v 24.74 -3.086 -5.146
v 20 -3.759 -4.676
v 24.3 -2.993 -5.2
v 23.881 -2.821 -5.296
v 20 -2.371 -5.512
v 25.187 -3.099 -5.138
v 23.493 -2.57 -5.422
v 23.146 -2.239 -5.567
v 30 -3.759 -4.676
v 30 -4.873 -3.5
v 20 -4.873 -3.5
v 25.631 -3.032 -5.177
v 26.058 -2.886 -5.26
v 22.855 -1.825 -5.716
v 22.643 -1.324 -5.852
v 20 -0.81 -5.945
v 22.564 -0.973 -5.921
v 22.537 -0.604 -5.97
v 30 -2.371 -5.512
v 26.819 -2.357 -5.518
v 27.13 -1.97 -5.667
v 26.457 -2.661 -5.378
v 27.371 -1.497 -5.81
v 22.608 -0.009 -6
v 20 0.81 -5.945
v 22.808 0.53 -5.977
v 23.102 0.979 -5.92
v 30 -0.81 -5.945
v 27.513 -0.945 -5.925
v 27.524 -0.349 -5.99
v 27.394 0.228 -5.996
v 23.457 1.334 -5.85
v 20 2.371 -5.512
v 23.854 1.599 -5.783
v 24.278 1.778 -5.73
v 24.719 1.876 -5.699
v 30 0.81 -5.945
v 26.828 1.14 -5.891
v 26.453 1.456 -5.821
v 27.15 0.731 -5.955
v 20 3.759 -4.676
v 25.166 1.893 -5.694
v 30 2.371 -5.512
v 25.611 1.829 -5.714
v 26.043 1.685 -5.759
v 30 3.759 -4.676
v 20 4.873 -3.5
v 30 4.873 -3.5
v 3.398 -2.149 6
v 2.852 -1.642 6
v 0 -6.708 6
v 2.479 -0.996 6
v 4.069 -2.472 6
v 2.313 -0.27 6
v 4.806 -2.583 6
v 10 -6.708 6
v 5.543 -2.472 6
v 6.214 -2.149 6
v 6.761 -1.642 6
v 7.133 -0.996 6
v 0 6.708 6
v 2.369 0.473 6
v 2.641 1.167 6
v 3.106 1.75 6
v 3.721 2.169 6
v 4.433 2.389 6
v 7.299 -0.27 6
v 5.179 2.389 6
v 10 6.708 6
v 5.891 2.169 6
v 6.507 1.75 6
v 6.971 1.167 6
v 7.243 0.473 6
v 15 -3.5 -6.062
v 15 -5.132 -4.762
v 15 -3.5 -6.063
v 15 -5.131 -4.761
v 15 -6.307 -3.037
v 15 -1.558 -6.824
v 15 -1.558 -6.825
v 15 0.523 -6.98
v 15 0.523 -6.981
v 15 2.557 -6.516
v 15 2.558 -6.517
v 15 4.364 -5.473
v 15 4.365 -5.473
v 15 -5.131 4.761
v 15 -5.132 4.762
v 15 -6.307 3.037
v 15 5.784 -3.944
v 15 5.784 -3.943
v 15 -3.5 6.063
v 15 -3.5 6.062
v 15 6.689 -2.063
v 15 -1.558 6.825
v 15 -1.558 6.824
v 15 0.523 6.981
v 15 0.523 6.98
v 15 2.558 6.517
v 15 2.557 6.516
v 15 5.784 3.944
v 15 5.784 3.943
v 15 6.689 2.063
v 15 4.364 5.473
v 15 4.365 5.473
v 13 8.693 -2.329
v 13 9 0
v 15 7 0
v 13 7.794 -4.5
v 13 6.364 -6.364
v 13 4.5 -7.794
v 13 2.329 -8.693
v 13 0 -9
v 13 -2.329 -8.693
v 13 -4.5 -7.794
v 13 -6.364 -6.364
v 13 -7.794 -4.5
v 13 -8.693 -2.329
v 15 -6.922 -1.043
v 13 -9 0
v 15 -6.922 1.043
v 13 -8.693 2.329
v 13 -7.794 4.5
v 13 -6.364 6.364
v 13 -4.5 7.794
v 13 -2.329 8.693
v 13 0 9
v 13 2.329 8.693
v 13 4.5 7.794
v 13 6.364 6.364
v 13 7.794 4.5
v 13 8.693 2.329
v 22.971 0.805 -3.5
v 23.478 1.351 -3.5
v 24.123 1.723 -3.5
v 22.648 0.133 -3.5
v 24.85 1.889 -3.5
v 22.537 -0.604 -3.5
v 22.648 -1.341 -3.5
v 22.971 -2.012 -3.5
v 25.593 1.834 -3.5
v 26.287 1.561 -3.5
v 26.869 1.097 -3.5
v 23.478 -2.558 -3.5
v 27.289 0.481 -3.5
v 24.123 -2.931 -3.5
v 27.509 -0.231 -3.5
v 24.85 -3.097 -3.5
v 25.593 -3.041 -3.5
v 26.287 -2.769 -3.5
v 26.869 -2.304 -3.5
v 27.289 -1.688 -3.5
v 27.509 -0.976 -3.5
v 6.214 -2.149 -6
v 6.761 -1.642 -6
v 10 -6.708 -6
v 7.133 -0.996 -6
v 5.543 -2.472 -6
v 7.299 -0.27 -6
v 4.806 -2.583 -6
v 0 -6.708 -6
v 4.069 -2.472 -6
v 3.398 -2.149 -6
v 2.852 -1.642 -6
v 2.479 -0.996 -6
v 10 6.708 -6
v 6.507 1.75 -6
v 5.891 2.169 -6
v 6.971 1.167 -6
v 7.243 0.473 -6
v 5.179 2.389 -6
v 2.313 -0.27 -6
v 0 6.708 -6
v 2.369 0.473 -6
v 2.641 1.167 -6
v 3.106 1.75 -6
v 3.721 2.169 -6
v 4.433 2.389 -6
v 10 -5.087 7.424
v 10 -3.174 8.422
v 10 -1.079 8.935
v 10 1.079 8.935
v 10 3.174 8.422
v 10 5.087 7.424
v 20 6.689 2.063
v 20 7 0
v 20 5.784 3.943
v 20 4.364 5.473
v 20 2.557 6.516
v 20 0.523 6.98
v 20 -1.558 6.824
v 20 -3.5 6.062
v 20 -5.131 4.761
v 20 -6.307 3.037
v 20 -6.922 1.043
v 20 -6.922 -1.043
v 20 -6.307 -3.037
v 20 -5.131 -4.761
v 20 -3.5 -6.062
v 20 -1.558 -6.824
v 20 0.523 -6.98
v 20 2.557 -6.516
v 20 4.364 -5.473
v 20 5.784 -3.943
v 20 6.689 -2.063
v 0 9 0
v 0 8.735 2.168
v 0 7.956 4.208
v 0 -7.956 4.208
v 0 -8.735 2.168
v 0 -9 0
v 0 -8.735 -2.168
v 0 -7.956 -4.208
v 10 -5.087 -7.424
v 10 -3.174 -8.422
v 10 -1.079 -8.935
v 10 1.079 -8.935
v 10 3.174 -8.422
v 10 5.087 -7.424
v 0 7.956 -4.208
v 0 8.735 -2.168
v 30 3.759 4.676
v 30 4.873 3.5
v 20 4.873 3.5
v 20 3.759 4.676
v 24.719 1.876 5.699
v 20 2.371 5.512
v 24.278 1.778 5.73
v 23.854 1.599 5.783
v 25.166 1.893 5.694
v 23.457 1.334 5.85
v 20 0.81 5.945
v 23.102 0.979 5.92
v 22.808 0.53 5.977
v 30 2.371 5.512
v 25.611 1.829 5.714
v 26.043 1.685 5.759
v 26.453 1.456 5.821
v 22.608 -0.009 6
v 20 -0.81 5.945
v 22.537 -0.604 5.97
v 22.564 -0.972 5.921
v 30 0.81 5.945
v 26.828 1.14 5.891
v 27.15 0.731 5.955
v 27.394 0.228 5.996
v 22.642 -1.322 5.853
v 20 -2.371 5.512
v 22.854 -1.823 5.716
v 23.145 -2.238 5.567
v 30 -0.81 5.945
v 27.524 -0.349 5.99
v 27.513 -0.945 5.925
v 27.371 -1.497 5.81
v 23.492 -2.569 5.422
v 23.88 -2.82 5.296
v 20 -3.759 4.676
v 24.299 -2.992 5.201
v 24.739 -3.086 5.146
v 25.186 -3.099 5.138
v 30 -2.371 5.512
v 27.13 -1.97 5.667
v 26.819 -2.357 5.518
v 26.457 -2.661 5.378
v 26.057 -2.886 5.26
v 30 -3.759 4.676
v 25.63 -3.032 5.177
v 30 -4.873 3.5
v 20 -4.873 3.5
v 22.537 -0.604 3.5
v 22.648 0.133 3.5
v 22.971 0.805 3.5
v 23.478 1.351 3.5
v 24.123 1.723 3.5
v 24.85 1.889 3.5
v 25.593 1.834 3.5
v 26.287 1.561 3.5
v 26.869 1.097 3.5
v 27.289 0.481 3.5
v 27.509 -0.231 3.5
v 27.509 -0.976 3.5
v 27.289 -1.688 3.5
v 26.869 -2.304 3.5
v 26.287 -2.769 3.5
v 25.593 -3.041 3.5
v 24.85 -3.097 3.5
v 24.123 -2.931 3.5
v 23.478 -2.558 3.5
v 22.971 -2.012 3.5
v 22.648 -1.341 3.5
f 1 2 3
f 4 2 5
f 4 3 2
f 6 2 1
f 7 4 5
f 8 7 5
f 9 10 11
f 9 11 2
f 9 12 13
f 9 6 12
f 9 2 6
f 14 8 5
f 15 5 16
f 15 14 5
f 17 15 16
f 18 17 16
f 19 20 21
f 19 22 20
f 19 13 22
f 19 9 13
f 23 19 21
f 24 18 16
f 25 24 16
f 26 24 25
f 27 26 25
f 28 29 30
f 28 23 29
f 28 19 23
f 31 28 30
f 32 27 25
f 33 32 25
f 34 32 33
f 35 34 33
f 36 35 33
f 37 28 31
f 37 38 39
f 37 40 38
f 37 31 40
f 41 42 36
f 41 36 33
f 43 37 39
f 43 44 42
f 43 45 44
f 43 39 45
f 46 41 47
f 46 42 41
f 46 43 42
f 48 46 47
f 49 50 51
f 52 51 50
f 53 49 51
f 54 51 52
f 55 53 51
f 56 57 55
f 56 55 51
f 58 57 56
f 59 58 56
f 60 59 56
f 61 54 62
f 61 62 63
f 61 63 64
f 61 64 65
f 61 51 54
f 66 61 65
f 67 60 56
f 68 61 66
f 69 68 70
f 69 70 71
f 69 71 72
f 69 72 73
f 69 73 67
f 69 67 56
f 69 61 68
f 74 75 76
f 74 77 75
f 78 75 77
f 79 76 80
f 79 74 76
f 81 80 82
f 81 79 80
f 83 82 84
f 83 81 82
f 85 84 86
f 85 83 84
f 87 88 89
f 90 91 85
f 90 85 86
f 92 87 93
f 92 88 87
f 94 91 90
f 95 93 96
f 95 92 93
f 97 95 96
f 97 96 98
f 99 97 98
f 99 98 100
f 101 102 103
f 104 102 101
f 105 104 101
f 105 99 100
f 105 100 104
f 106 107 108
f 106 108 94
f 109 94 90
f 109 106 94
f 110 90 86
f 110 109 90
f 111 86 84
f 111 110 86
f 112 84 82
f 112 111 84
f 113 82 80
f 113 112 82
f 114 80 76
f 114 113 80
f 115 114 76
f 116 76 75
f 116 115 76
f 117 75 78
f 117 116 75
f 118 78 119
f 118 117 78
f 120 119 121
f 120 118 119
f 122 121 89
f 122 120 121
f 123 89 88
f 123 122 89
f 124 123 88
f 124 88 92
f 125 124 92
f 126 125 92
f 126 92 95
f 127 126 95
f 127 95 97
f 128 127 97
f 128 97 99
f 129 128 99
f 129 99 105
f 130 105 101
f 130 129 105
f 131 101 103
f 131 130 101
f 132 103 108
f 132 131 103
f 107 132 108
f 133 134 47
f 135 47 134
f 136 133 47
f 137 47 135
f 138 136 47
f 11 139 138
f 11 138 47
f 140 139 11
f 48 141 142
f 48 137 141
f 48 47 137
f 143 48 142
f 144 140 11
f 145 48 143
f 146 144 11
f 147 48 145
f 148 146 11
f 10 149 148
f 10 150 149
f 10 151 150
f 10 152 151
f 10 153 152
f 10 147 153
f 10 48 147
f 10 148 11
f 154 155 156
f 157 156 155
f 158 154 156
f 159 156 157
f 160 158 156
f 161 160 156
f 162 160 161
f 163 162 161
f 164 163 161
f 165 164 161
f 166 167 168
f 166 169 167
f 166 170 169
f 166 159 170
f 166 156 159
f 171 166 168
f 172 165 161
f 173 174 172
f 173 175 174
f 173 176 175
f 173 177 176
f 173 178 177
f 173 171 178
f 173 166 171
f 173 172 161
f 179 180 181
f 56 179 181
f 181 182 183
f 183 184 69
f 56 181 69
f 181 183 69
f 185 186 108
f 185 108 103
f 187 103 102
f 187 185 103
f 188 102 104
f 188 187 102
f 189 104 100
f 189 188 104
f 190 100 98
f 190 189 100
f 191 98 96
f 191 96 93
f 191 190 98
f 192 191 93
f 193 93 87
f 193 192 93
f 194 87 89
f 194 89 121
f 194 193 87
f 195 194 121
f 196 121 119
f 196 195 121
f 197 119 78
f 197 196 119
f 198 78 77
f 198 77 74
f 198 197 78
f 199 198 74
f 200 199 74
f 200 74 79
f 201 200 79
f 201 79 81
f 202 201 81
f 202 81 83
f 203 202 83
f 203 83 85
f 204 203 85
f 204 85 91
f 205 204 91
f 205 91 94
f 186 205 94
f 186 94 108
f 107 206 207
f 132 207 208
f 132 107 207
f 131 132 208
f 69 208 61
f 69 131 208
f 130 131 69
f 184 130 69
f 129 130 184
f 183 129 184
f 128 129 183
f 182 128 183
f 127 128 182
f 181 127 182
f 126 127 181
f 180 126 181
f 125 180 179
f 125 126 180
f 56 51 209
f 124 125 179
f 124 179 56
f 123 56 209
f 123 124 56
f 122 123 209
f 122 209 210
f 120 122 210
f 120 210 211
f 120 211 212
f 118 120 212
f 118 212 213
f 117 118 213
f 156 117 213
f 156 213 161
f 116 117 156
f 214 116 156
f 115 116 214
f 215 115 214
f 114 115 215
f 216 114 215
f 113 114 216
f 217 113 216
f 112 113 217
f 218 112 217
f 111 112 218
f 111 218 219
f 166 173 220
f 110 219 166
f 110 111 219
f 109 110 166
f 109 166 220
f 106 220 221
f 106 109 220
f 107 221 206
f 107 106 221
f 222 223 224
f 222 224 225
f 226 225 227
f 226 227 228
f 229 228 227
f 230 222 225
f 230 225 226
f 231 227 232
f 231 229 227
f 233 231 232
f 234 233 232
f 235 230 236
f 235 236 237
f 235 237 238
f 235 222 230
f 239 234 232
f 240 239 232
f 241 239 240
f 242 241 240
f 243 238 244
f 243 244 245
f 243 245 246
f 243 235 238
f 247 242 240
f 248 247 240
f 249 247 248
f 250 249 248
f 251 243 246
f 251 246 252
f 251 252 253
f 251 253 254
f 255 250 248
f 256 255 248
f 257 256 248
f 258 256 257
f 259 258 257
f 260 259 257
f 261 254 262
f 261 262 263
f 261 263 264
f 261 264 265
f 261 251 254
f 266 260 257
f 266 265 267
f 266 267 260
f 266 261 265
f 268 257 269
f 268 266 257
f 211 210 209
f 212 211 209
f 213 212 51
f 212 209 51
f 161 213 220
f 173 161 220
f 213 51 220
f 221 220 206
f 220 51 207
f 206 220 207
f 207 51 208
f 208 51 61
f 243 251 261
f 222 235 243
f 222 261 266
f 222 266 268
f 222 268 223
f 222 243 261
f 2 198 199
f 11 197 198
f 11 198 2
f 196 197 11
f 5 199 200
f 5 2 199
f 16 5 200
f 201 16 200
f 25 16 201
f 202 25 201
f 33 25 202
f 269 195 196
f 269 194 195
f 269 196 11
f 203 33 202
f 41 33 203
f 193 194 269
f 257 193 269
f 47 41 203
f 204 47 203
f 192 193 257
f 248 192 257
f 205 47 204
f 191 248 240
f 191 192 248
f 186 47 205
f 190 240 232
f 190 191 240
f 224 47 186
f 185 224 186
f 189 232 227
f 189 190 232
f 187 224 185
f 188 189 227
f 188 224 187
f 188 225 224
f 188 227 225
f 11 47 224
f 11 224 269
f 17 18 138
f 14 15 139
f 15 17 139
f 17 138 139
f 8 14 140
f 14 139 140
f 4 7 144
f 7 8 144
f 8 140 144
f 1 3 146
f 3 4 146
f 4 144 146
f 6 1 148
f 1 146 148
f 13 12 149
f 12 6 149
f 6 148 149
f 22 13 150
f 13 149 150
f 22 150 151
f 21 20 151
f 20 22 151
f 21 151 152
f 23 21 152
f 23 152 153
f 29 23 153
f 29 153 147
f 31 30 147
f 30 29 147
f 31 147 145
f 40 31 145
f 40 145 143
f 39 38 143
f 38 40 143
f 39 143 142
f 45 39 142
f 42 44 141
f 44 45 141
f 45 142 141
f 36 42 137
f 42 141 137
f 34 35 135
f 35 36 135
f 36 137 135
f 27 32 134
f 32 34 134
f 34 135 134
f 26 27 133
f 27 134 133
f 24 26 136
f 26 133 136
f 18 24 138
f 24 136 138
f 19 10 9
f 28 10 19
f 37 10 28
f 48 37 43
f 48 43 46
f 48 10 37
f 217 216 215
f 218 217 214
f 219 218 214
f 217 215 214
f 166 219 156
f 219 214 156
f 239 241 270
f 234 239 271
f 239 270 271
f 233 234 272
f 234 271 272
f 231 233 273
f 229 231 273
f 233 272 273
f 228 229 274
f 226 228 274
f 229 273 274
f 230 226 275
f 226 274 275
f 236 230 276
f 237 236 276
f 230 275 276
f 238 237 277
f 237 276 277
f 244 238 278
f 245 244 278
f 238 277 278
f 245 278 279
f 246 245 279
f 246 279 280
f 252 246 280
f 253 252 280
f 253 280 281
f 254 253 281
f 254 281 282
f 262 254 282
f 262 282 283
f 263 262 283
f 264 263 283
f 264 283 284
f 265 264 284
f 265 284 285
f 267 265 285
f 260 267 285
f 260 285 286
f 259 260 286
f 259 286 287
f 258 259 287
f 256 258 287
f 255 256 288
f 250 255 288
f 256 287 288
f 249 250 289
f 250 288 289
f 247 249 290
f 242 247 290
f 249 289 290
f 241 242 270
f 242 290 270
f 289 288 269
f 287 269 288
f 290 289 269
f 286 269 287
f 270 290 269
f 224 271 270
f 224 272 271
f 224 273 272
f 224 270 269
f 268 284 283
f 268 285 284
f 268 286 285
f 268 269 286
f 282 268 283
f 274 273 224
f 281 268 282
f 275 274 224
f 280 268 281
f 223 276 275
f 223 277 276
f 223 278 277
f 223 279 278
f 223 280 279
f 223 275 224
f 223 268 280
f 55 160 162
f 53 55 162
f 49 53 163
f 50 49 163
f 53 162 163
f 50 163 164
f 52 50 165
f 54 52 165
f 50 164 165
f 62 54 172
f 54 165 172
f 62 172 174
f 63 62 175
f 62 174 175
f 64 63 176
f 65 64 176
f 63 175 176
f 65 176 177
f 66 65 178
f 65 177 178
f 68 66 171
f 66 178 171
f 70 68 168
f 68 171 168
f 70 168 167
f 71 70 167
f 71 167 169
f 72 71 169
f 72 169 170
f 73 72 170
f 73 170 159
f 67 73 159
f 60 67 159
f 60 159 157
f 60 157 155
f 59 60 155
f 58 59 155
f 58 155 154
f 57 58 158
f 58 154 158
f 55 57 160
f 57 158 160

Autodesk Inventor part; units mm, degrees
ref_plane "YZ Plane" through (0, 0, 0) normal (1, 0, 0) x (0, 1, 0)
ref_plane "XZ Plane" through (0, 0, 0) normal (0, 1, 0) x (-1, 0, 0)
sketch "Sketch1" plane through (0, 0, 0) normal (0, 0, 1) x (1, 0, 0)
  line L0 (0, 0) -> (30, 0)
  line L1 (0, 0) -> (0, 9)
  line L2 (0, 9) -> (15, 9)
  line L3 (15, 9) -> (15, 7)
  line L4 (15, 7) -> (20, 7)
  line L5 (20, 7) -> (20, 6)
  line L6 (20, 6) -> (30, 6)
  line L7 (30, 6) -> (30, 0)
  dimension "d5" = 18
  dimension "d6" = 5
  dimension "d7" = 14
  dimension "d8" = 12
  dimension "d9" = 10
  dimension "d10" = 15
revolve "Revolution1" add sketch "Sketch1" angle 360 about axis through (0, 0, 0) along (1, 0, 0)
chamfer "Chamfer1" distance 2 angle 45 1 edges at (15, -9, 0)
ref_plane "Work Plane1" through (7.5, 0, 9) normal (0, 0, 1) x (1, 0, 0)
sketch "Sketch2" plane through (7.5, 0, 9) normal (0, 0, 1) x (1, 0, 0)
  line L0 (-7.5, -9) -> (-7.5, 9) projected
  line L1 (2.5, 8) -> (-7.5, 8)
  line L2 (-7.5, 8) -> (-7.5, -12)
  line L3 (-7.5, -12) -> (2.5, -12)
  line L4 (2.5, -12) -> (2.5, 8)
  line L5 (-7.5, -9) -> (-7.5, 9) projected
  line L6 (-7.5, -9) -> (5.5, -9) projected
  line L7 (-7.5, 9) -> (5.5, 9) projected
  line L8 (5.5, -9) -> (5.5, 9) projected
  point P0 (-7.5, 0)
  point P1 (-7.5, 8)
  dimension "d11" = 10
  dimension "d14" = 20
  dimension "d15" = -1
  dimension "d16" = 3
  dimension "d19" = 18
extrude "Extrusion1" cut sketch "Sketch2" against normal blind 3 contours L6 L4 L3 L2 | L0 L1 L4 L6
mirror "Mirror1" about plane through (0, 0, 0) normal (0, 0, 1) of "Extrusion1"
sketch "Sketch3" plane through (7.5, 0, 6) normal (0, 0, 1) x (1, 0, 0)
  point P0 (-7.5, 0)
  point P1 (-2.6939, -0.0831)
hole "Hole1" at (4.8061, -0.0831, 6) direction (0, 0, -1) diameter 5 end through all
sketch "Sketch4" plane through (30, 0, 0) normal (1, 0, 0) x (0, 0, -1)
  circle A0 centre (0, 0) radius 6 projected
  circle A1 centre (0, 0) radius 7 projected
  circle A2 centre (0, 0) radius 6 projected
  circle A3 centre (0, 0) radius 7 projected
  line L0 (-3.5, 6.0622) -> (3.5, 6.0622)
  line L1 (3.5, 6.0622) -> (3.5, -6.0622)
  line L2 (3.5, -6.0622) -> (-3.5, -6.0622)
  line L3 (-3.5, -6.0622) -> (-3.5, 6.0622)
  line L4 (0, -12.6) -> (0, 12.6) projected
  point P0 (-3.5, -6.0622)
  point P1 (3.5, -6.0622)
  point P2 (3.5, 6.0622)
  point P3 (-3.5, 6.0622)
  dimension "d27" = 7
extrude "Extrusion2" cut sketch "Sketch4" against normal blind 10 contours L1 A0 L4 | A0 L4 L0 L1 | L1 L2 L4 A0 | L4 A0 L3 | A0 L3 L0 L4 | L0 L4 A1 | L4 L2 L3 A0 | A1 L4 L2 | L0 A1 L4 | L4 A1 L2
sketch "Sketch5" plane through (30, -4.8734, 3.5) normal (0, 0, -1) x (-1, 0, 0)
  line L0 (0, 9.7468) -> (10, 9.7468) projected
  line L1 (10, 9.7468) -> (10, 0) projected
  line L2 (10, 0) -> (0, 0) projected
  line L3 (0, 9.7468) -> (0, 0) projected
  circle A0 centre (4.9634, 4.2697) radius 2.5
  line L4 (4.9634, 4.2697) -> (0, 4.8734) construction
  line L5 (0, 9.7468) -> (0, 0) projected
  line L6 (4.9634, 4.2697) -> (5, 9.7468) construction
  point P0 (30, 4.8734)
  dimension "d30" = 5
  dimension "d32" = 5.4772
  dimension "d33" = 5
extrude "Extrusion3" cut sketch "Sketch5" along normal through all both and the other way through all contours A0
equation "\"d15\" = -0.5 * d14 + 0.5 * d19"
properties part number "McCrea_krk_walle"
